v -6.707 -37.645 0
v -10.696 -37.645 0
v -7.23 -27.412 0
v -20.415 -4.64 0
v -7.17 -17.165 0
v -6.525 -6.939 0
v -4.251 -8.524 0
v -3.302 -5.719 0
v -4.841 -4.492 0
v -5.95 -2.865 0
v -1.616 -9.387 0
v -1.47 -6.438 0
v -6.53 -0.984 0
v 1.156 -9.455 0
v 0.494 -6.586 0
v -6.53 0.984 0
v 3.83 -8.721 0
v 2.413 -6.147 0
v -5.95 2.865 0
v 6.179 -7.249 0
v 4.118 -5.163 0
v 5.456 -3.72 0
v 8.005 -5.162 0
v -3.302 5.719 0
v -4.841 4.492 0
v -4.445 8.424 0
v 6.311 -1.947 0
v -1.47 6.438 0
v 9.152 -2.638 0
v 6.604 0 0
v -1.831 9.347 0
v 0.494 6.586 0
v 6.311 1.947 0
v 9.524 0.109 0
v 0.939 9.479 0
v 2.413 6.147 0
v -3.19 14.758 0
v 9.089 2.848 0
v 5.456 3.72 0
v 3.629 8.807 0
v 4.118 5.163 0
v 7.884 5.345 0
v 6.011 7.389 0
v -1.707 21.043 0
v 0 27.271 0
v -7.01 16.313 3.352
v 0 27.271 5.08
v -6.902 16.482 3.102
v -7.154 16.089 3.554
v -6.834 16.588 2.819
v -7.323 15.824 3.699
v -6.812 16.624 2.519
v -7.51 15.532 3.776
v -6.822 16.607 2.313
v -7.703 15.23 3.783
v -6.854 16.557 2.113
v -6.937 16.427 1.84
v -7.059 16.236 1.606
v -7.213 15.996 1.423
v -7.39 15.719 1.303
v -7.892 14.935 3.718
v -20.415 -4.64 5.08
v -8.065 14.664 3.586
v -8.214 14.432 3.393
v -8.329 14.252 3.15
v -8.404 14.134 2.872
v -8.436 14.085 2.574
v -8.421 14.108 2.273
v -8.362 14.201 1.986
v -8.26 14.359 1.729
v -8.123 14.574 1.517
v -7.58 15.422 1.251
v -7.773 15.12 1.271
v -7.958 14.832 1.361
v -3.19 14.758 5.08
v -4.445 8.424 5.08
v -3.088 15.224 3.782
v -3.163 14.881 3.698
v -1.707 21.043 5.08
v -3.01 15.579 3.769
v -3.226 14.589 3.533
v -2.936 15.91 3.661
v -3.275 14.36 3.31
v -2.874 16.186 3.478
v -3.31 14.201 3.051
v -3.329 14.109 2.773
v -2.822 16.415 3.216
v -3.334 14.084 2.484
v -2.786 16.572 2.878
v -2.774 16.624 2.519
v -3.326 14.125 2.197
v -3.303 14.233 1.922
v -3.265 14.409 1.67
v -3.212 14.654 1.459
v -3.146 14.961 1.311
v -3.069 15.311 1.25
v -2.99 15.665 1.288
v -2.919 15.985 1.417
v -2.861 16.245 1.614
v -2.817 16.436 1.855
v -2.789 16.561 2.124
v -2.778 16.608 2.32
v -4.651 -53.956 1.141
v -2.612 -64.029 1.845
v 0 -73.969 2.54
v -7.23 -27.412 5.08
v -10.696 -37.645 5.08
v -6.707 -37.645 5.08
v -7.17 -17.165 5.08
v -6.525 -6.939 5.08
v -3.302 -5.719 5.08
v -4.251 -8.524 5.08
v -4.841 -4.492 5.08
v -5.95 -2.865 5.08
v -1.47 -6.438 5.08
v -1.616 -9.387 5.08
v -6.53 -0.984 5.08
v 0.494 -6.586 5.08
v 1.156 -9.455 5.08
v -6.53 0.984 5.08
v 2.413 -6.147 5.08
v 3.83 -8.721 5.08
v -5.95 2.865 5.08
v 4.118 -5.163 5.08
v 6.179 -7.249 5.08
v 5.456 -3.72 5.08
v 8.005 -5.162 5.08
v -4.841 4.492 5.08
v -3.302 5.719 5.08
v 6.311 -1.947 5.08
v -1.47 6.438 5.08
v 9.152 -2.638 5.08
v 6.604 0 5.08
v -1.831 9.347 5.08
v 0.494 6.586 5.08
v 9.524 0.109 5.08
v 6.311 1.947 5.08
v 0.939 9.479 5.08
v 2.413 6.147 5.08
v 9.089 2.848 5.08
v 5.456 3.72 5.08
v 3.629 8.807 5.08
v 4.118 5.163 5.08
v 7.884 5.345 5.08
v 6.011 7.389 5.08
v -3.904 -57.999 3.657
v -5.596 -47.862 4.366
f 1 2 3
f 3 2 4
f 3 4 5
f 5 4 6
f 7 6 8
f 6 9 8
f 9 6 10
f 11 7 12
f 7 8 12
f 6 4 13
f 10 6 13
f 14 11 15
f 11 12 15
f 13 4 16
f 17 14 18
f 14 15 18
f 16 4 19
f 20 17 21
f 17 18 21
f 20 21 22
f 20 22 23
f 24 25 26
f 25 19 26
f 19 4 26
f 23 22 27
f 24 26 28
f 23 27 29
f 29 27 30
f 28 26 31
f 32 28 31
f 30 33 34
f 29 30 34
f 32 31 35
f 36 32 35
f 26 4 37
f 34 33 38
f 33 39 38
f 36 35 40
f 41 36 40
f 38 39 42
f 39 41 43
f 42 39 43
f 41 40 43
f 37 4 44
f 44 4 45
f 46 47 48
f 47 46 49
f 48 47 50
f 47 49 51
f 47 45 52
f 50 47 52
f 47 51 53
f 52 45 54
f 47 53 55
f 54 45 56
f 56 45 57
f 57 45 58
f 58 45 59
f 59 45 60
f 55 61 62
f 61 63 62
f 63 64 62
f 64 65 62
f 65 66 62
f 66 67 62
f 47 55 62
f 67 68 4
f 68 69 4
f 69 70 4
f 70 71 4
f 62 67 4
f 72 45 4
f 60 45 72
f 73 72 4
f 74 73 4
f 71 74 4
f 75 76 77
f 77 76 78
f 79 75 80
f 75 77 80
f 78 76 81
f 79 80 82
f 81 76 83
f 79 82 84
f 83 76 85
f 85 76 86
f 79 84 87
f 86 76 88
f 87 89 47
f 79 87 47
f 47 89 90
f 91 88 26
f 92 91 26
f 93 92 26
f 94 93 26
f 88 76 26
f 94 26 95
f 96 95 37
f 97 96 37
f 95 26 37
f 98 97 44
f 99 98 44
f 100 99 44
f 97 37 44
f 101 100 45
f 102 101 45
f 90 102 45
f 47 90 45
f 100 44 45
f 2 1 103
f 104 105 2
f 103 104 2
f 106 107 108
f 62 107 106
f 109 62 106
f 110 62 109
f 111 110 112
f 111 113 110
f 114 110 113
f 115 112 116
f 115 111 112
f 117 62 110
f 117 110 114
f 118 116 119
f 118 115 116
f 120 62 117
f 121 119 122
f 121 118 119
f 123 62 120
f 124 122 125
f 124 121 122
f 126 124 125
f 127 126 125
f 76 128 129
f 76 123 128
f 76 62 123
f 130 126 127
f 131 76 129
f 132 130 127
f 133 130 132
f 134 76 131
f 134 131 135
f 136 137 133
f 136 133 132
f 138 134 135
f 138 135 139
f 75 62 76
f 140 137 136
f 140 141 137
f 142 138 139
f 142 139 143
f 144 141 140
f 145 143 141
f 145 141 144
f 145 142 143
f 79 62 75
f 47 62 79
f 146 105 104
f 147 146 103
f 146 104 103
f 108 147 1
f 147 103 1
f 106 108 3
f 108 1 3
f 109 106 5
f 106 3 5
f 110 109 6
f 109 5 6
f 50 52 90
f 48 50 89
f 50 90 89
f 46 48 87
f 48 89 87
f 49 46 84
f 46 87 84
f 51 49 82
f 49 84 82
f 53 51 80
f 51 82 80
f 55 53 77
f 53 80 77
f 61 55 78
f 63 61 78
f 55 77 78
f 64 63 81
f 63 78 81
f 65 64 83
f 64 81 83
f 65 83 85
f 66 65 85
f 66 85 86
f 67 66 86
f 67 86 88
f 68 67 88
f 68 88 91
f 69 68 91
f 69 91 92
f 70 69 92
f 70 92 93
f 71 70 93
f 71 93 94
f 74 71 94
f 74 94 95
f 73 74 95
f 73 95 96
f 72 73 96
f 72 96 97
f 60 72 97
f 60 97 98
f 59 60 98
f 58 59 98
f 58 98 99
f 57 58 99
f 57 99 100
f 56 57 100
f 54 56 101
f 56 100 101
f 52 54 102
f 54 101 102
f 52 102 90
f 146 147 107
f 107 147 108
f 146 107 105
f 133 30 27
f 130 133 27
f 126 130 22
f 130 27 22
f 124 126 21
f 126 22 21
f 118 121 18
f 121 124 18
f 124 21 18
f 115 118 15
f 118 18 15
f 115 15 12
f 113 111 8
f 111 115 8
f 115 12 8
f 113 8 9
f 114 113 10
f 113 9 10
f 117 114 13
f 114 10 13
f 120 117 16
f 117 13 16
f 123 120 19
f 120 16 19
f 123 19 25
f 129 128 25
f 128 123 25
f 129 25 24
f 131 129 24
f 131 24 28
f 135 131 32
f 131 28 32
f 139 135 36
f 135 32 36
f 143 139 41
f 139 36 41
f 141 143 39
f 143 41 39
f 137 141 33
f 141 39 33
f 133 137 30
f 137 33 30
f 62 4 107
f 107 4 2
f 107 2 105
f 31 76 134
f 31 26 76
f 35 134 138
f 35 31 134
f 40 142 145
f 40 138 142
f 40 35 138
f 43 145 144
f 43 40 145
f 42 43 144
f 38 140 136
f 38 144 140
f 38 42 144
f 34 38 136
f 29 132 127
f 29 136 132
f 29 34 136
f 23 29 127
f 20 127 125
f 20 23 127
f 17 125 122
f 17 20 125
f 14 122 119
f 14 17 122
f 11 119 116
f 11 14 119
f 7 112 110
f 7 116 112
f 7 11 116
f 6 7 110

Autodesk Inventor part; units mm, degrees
ref_plane "YZ Plane" through (0, 0, 0) normal (1, 0, 0) x (0, 1, 0)
ref_plane "XZ Plane" through (0, 0, 0) normal (0, 1, 0) x (-1, 0, 0)
ref_plane "XY Plane" through (0, 0, 0) normal (0, 0, 1) x (1, 0, 0)
sketch "Sketch1" plane through (0, 0, 0) normal (0, 0, 1) x (1, 0, 0)
  circle A0 centre (0, 0) radius 6.604
  arc A1 (-6.5253, -6.9387) -> (-4.4452, 8.4241) centre (0, 0) ccw
  line L0 (0, 27.271) -> (-20.415, -4.6403)
  line L1 (-20.415, -4.6403) -> (0, -73.9689)
  arc A2 (0, 27.271) -> (-4.4452, 8.4241) centre (172.4432, -23.349) ccw
  arc A3 (-6.5253, -6.9387) -> (0, -73.9689) centre (172.4432, -23.349) ccw
  dimension "d0" = 13.208
  dimension "d1" = 19.05
extrude "Extrusion1" add sketch "Sketch1" along normal blind 5.08
sketch "Sketch2" plane through (0, 0, 0) normal (1, 0, 0) x (0, 1, 0)
  line L0 (-73.9689, 0) -> (-73.9689, 5.08) projected
  line L1 (-73.9689, 2.54) -> (-0.7706, 7.6585)
  line L2 (-0.7706, 7.6585) -> (-0.7706, -2.5785)
  line L3 (-0.7706, -2.5785) -> (-73.9689, 2.54)
  line L4 (-0.7706, -2.5785) -> (-76.3846, -2.5785)
  line L5 (-76.3846, -2.5785) -> (-76.3846, 10.5273)
  line L6 (-76.3846, 10.5273) -> (-0.7706, 10.5273)
  line L7 (-0.7706, 10.5273) -> (-0.7706, 7.6585)
  point P0 (0, 0)
  dimension "d4" = 86
  dimension "d5" = 86
extrude "Extrusion2" cut sketch "Sketch2" against normal blind 25.7175 contours L3 L4 L5 L6 L7 L1
sketch "Sketch3" plane through (0, 0, 0) normal (1, 0, 0) x (0, 1, 0)
  line L0 (8.4241, 0) -> (27.271, 0) projected
  line L1 (15.3537, 0) -> (15.3537, 5.0379)
  circle A0 centre (15.3537, 2.519) radius 1.27
  point P0 (0, 0)
  dimension "d8" = 2.54
extrude "Extrusion3" cut sketch "Sketch3" against normal blind 25.7175
sketch "Sketch4" plane through (0, 0, 0) normal (0, 1, 0) x (-1, 0, 0)
  line L0 (20.415, 0) -> (20.415, 5.08) projected
  line L1 (6.5253, 5.08) -> (-9.525, 5.08) projected
  point P0 (0, 0)
  point P1 (4.4452, 5.08)
  dimension "d11" = 29.94
properties part number "legV2"
